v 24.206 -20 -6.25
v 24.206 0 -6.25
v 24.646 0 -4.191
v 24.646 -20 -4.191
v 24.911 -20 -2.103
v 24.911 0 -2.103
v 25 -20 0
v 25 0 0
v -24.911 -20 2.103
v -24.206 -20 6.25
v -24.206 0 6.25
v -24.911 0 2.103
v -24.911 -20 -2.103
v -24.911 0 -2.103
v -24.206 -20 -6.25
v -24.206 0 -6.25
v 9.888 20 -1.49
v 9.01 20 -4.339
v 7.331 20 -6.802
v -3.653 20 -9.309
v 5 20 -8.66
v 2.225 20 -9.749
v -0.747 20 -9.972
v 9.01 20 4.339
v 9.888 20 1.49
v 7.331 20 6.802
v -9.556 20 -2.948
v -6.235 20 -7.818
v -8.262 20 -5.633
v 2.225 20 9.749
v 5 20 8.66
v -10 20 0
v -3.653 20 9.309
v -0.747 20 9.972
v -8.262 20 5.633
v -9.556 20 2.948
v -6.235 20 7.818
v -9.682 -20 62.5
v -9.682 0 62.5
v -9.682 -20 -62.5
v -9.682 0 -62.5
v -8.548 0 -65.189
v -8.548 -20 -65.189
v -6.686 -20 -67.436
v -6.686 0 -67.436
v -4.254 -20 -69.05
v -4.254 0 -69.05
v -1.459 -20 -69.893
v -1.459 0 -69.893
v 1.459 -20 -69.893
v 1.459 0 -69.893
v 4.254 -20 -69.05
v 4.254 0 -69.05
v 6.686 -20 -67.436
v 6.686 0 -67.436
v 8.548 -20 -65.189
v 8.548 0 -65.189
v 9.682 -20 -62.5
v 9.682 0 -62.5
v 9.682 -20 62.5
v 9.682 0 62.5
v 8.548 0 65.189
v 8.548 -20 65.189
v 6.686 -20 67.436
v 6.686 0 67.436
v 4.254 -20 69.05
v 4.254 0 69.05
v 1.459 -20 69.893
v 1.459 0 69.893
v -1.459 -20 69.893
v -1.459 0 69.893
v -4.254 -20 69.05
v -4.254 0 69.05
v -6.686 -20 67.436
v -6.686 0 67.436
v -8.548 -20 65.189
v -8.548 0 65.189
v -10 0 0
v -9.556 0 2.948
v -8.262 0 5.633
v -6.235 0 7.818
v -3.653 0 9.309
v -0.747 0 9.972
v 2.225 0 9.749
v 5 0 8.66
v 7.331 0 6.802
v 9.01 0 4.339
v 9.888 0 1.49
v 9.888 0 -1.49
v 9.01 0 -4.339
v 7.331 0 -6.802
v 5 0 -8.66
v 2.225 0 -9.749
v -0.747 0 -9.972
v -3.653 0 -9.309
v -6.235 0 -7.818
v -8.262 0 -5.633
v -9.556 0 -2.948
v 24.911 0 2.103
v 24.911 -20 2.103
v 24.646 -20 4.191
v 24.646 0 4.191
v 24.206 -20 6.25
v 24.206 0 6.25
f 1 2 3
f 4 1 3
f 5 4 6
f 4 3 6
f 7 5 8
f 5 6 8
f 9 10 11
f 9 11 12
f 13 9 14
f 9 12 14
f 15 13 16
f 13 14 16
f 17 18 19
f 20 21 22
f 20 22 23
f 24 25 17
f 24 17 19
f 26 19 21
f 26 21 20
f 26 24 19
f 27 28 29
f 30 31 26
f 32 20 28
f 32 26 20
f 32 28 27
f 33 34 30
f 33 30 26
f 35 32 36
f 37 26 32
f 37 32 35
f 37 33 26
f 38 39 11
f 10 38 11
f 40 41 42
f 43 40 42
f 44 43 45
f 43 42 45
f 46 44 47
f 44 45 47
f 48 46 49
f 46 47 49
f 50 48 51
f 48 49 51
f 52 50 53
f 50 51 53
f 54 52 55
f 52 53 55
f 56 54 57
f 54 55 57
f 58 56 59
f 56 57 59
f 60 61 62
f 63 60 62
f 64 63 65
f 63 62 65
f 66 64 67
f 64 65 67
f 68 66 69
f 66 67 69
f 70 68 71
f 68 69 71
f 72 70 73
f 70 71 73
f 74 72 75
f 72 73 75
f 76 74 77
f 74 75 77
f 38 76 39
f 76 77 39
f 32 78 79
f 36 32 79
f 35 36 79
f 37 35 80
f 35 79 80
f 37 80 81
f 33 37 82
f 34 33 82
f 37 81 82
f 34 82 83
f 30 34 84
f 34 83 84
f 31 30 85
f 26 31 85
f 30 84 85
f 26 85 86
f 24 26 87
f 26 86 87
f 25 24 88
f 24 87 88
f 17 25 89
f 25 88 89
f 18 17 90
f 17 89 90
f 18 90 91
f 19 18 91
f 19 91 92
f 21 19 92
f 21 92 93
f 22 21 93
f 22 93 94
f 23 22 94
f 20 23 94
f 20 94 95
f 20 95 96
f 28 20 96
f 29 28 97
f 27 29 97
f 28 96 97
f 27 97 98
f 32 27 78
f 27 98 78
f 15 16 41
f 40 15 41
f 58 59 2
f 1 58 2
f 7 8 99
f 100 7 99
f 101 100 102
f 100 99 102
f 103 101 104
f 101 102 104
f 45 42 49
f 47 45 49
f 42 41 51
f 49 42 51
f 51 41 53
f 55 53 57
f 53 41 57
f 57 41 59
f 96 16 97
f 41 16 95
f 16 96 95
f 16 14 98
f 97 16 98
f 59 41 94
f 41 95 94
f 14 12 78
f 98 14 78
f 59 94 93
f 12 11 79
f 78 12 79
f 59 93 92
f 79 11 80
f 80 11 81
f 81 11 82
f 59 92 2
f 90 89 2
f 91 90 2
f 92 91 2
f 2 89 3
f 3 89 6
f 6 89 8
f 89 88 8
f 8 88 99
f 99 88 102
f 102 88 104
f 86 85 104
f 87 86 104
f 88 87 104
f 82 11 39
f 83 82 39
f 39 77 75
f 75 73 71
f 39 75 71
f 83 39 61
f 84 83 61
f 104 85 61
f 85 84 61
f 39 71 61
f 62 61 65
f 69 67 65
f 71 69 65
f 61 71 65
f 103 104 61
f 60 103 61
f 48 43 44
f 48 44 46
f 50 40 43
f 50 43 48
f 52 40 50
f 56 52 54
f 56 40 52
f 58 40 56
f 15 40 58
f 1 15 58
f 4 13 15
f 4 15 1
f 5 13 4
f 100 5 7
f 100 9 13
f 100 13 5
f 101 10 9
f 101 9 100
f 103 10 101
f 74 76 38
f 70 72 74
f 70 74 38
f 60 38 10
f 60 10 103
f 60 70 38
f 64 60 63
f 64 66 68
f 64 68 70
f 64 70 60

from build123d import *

# Parameters (mm, degrees)
F1_DEPTH = 20
F2_R     = 10
F3_DEPTH = 20


with BuildPart() as f1:
    # F0 (on Front) → F1 (new body)
    with BuildSketch(Plane.XZ):
        with BuildLine():
            ThreePointArc((24.206146, -6.25), (24.800742, -3.150107), (25, 0))
            ThreePointArc((25, 0), (24.800742, 3.150107), (24.206146, 6.25))
            ThreePointArc((24.206146, 6.25), (0, 25), (-24.206146, 6.25))
            ThreePointArc((-24.206146, 6.25), (-25, 0), (-24.206146, -6.25))
            ThreePointArc((-24.206146, -6.25), (0, -25), (24.206146, -6.25))
        make_face()
        with BuildLine():
            ThreePointArc((-24.206146, 6.25), (0, 25), (24.206146, 6.25))
            Line((24.206146, 6.25), (9.682458, 62.5))
            ThreePointArc((9.682458, 62.5), (9.920297, 61.260043), (10, 60))
            ThreePointArc((10, 60), (-1.260043, 50.079703), (-9.682458, 62.5))
            Line((-9.682458, 62.5), (-24.206146, 6.25))
        make_face()
        with BuildLine():
            Line((9.682458, -62.5), (24.206146, -6.25))
            ThreePointArc((24.206146, -6.25), (0, -25), (-24.206146, -6.25))
            Line((-24.206146, -6.25), (-9.682458, -62.5))
            ThreePointArc((-9.682458, -62.5), (-1.260043, -50.079703), (10, -60))
            ThreePointArc((10, -60), (9.920297, -61.260043), (9.682458, -62.5))
        make_face()
        with BuildLine():
            ThreePointArc((10, 60), (9.920297, 61.260043), (9.682458, 62.5))
            ThreePointArc((9.682458, 62.5), (0, 70), (-9.682458, 62.5))
            ThreePointArc((-9.682458, 62.5), (-1.260043, 50.079703), (10, 60))
        make_face()
        with BuildLine():
            ThreePointArc((-9.682458, -62.5), (0, -70), (9.682458, -62.5))
            ThreePointArc((9.682458, -62.5), (9.920297, -61.260043), (10, -60))
            ThreePointArc((10, -60), (-1.260043, -50.079703), (-9.682458, -62.5))
        make_face()
    extrude(amount=F1_DEPTH)

    # F2 (on face) → F3 (join)
    with BuildSketch(Plane(origin=(0, 0, 0), x_dir=(-1, 0, 0), z_dir=(0, 1, 0))):
        Circle(F2_R)
    extrude(amount=F3_DEPTH)


solid = f1.part
